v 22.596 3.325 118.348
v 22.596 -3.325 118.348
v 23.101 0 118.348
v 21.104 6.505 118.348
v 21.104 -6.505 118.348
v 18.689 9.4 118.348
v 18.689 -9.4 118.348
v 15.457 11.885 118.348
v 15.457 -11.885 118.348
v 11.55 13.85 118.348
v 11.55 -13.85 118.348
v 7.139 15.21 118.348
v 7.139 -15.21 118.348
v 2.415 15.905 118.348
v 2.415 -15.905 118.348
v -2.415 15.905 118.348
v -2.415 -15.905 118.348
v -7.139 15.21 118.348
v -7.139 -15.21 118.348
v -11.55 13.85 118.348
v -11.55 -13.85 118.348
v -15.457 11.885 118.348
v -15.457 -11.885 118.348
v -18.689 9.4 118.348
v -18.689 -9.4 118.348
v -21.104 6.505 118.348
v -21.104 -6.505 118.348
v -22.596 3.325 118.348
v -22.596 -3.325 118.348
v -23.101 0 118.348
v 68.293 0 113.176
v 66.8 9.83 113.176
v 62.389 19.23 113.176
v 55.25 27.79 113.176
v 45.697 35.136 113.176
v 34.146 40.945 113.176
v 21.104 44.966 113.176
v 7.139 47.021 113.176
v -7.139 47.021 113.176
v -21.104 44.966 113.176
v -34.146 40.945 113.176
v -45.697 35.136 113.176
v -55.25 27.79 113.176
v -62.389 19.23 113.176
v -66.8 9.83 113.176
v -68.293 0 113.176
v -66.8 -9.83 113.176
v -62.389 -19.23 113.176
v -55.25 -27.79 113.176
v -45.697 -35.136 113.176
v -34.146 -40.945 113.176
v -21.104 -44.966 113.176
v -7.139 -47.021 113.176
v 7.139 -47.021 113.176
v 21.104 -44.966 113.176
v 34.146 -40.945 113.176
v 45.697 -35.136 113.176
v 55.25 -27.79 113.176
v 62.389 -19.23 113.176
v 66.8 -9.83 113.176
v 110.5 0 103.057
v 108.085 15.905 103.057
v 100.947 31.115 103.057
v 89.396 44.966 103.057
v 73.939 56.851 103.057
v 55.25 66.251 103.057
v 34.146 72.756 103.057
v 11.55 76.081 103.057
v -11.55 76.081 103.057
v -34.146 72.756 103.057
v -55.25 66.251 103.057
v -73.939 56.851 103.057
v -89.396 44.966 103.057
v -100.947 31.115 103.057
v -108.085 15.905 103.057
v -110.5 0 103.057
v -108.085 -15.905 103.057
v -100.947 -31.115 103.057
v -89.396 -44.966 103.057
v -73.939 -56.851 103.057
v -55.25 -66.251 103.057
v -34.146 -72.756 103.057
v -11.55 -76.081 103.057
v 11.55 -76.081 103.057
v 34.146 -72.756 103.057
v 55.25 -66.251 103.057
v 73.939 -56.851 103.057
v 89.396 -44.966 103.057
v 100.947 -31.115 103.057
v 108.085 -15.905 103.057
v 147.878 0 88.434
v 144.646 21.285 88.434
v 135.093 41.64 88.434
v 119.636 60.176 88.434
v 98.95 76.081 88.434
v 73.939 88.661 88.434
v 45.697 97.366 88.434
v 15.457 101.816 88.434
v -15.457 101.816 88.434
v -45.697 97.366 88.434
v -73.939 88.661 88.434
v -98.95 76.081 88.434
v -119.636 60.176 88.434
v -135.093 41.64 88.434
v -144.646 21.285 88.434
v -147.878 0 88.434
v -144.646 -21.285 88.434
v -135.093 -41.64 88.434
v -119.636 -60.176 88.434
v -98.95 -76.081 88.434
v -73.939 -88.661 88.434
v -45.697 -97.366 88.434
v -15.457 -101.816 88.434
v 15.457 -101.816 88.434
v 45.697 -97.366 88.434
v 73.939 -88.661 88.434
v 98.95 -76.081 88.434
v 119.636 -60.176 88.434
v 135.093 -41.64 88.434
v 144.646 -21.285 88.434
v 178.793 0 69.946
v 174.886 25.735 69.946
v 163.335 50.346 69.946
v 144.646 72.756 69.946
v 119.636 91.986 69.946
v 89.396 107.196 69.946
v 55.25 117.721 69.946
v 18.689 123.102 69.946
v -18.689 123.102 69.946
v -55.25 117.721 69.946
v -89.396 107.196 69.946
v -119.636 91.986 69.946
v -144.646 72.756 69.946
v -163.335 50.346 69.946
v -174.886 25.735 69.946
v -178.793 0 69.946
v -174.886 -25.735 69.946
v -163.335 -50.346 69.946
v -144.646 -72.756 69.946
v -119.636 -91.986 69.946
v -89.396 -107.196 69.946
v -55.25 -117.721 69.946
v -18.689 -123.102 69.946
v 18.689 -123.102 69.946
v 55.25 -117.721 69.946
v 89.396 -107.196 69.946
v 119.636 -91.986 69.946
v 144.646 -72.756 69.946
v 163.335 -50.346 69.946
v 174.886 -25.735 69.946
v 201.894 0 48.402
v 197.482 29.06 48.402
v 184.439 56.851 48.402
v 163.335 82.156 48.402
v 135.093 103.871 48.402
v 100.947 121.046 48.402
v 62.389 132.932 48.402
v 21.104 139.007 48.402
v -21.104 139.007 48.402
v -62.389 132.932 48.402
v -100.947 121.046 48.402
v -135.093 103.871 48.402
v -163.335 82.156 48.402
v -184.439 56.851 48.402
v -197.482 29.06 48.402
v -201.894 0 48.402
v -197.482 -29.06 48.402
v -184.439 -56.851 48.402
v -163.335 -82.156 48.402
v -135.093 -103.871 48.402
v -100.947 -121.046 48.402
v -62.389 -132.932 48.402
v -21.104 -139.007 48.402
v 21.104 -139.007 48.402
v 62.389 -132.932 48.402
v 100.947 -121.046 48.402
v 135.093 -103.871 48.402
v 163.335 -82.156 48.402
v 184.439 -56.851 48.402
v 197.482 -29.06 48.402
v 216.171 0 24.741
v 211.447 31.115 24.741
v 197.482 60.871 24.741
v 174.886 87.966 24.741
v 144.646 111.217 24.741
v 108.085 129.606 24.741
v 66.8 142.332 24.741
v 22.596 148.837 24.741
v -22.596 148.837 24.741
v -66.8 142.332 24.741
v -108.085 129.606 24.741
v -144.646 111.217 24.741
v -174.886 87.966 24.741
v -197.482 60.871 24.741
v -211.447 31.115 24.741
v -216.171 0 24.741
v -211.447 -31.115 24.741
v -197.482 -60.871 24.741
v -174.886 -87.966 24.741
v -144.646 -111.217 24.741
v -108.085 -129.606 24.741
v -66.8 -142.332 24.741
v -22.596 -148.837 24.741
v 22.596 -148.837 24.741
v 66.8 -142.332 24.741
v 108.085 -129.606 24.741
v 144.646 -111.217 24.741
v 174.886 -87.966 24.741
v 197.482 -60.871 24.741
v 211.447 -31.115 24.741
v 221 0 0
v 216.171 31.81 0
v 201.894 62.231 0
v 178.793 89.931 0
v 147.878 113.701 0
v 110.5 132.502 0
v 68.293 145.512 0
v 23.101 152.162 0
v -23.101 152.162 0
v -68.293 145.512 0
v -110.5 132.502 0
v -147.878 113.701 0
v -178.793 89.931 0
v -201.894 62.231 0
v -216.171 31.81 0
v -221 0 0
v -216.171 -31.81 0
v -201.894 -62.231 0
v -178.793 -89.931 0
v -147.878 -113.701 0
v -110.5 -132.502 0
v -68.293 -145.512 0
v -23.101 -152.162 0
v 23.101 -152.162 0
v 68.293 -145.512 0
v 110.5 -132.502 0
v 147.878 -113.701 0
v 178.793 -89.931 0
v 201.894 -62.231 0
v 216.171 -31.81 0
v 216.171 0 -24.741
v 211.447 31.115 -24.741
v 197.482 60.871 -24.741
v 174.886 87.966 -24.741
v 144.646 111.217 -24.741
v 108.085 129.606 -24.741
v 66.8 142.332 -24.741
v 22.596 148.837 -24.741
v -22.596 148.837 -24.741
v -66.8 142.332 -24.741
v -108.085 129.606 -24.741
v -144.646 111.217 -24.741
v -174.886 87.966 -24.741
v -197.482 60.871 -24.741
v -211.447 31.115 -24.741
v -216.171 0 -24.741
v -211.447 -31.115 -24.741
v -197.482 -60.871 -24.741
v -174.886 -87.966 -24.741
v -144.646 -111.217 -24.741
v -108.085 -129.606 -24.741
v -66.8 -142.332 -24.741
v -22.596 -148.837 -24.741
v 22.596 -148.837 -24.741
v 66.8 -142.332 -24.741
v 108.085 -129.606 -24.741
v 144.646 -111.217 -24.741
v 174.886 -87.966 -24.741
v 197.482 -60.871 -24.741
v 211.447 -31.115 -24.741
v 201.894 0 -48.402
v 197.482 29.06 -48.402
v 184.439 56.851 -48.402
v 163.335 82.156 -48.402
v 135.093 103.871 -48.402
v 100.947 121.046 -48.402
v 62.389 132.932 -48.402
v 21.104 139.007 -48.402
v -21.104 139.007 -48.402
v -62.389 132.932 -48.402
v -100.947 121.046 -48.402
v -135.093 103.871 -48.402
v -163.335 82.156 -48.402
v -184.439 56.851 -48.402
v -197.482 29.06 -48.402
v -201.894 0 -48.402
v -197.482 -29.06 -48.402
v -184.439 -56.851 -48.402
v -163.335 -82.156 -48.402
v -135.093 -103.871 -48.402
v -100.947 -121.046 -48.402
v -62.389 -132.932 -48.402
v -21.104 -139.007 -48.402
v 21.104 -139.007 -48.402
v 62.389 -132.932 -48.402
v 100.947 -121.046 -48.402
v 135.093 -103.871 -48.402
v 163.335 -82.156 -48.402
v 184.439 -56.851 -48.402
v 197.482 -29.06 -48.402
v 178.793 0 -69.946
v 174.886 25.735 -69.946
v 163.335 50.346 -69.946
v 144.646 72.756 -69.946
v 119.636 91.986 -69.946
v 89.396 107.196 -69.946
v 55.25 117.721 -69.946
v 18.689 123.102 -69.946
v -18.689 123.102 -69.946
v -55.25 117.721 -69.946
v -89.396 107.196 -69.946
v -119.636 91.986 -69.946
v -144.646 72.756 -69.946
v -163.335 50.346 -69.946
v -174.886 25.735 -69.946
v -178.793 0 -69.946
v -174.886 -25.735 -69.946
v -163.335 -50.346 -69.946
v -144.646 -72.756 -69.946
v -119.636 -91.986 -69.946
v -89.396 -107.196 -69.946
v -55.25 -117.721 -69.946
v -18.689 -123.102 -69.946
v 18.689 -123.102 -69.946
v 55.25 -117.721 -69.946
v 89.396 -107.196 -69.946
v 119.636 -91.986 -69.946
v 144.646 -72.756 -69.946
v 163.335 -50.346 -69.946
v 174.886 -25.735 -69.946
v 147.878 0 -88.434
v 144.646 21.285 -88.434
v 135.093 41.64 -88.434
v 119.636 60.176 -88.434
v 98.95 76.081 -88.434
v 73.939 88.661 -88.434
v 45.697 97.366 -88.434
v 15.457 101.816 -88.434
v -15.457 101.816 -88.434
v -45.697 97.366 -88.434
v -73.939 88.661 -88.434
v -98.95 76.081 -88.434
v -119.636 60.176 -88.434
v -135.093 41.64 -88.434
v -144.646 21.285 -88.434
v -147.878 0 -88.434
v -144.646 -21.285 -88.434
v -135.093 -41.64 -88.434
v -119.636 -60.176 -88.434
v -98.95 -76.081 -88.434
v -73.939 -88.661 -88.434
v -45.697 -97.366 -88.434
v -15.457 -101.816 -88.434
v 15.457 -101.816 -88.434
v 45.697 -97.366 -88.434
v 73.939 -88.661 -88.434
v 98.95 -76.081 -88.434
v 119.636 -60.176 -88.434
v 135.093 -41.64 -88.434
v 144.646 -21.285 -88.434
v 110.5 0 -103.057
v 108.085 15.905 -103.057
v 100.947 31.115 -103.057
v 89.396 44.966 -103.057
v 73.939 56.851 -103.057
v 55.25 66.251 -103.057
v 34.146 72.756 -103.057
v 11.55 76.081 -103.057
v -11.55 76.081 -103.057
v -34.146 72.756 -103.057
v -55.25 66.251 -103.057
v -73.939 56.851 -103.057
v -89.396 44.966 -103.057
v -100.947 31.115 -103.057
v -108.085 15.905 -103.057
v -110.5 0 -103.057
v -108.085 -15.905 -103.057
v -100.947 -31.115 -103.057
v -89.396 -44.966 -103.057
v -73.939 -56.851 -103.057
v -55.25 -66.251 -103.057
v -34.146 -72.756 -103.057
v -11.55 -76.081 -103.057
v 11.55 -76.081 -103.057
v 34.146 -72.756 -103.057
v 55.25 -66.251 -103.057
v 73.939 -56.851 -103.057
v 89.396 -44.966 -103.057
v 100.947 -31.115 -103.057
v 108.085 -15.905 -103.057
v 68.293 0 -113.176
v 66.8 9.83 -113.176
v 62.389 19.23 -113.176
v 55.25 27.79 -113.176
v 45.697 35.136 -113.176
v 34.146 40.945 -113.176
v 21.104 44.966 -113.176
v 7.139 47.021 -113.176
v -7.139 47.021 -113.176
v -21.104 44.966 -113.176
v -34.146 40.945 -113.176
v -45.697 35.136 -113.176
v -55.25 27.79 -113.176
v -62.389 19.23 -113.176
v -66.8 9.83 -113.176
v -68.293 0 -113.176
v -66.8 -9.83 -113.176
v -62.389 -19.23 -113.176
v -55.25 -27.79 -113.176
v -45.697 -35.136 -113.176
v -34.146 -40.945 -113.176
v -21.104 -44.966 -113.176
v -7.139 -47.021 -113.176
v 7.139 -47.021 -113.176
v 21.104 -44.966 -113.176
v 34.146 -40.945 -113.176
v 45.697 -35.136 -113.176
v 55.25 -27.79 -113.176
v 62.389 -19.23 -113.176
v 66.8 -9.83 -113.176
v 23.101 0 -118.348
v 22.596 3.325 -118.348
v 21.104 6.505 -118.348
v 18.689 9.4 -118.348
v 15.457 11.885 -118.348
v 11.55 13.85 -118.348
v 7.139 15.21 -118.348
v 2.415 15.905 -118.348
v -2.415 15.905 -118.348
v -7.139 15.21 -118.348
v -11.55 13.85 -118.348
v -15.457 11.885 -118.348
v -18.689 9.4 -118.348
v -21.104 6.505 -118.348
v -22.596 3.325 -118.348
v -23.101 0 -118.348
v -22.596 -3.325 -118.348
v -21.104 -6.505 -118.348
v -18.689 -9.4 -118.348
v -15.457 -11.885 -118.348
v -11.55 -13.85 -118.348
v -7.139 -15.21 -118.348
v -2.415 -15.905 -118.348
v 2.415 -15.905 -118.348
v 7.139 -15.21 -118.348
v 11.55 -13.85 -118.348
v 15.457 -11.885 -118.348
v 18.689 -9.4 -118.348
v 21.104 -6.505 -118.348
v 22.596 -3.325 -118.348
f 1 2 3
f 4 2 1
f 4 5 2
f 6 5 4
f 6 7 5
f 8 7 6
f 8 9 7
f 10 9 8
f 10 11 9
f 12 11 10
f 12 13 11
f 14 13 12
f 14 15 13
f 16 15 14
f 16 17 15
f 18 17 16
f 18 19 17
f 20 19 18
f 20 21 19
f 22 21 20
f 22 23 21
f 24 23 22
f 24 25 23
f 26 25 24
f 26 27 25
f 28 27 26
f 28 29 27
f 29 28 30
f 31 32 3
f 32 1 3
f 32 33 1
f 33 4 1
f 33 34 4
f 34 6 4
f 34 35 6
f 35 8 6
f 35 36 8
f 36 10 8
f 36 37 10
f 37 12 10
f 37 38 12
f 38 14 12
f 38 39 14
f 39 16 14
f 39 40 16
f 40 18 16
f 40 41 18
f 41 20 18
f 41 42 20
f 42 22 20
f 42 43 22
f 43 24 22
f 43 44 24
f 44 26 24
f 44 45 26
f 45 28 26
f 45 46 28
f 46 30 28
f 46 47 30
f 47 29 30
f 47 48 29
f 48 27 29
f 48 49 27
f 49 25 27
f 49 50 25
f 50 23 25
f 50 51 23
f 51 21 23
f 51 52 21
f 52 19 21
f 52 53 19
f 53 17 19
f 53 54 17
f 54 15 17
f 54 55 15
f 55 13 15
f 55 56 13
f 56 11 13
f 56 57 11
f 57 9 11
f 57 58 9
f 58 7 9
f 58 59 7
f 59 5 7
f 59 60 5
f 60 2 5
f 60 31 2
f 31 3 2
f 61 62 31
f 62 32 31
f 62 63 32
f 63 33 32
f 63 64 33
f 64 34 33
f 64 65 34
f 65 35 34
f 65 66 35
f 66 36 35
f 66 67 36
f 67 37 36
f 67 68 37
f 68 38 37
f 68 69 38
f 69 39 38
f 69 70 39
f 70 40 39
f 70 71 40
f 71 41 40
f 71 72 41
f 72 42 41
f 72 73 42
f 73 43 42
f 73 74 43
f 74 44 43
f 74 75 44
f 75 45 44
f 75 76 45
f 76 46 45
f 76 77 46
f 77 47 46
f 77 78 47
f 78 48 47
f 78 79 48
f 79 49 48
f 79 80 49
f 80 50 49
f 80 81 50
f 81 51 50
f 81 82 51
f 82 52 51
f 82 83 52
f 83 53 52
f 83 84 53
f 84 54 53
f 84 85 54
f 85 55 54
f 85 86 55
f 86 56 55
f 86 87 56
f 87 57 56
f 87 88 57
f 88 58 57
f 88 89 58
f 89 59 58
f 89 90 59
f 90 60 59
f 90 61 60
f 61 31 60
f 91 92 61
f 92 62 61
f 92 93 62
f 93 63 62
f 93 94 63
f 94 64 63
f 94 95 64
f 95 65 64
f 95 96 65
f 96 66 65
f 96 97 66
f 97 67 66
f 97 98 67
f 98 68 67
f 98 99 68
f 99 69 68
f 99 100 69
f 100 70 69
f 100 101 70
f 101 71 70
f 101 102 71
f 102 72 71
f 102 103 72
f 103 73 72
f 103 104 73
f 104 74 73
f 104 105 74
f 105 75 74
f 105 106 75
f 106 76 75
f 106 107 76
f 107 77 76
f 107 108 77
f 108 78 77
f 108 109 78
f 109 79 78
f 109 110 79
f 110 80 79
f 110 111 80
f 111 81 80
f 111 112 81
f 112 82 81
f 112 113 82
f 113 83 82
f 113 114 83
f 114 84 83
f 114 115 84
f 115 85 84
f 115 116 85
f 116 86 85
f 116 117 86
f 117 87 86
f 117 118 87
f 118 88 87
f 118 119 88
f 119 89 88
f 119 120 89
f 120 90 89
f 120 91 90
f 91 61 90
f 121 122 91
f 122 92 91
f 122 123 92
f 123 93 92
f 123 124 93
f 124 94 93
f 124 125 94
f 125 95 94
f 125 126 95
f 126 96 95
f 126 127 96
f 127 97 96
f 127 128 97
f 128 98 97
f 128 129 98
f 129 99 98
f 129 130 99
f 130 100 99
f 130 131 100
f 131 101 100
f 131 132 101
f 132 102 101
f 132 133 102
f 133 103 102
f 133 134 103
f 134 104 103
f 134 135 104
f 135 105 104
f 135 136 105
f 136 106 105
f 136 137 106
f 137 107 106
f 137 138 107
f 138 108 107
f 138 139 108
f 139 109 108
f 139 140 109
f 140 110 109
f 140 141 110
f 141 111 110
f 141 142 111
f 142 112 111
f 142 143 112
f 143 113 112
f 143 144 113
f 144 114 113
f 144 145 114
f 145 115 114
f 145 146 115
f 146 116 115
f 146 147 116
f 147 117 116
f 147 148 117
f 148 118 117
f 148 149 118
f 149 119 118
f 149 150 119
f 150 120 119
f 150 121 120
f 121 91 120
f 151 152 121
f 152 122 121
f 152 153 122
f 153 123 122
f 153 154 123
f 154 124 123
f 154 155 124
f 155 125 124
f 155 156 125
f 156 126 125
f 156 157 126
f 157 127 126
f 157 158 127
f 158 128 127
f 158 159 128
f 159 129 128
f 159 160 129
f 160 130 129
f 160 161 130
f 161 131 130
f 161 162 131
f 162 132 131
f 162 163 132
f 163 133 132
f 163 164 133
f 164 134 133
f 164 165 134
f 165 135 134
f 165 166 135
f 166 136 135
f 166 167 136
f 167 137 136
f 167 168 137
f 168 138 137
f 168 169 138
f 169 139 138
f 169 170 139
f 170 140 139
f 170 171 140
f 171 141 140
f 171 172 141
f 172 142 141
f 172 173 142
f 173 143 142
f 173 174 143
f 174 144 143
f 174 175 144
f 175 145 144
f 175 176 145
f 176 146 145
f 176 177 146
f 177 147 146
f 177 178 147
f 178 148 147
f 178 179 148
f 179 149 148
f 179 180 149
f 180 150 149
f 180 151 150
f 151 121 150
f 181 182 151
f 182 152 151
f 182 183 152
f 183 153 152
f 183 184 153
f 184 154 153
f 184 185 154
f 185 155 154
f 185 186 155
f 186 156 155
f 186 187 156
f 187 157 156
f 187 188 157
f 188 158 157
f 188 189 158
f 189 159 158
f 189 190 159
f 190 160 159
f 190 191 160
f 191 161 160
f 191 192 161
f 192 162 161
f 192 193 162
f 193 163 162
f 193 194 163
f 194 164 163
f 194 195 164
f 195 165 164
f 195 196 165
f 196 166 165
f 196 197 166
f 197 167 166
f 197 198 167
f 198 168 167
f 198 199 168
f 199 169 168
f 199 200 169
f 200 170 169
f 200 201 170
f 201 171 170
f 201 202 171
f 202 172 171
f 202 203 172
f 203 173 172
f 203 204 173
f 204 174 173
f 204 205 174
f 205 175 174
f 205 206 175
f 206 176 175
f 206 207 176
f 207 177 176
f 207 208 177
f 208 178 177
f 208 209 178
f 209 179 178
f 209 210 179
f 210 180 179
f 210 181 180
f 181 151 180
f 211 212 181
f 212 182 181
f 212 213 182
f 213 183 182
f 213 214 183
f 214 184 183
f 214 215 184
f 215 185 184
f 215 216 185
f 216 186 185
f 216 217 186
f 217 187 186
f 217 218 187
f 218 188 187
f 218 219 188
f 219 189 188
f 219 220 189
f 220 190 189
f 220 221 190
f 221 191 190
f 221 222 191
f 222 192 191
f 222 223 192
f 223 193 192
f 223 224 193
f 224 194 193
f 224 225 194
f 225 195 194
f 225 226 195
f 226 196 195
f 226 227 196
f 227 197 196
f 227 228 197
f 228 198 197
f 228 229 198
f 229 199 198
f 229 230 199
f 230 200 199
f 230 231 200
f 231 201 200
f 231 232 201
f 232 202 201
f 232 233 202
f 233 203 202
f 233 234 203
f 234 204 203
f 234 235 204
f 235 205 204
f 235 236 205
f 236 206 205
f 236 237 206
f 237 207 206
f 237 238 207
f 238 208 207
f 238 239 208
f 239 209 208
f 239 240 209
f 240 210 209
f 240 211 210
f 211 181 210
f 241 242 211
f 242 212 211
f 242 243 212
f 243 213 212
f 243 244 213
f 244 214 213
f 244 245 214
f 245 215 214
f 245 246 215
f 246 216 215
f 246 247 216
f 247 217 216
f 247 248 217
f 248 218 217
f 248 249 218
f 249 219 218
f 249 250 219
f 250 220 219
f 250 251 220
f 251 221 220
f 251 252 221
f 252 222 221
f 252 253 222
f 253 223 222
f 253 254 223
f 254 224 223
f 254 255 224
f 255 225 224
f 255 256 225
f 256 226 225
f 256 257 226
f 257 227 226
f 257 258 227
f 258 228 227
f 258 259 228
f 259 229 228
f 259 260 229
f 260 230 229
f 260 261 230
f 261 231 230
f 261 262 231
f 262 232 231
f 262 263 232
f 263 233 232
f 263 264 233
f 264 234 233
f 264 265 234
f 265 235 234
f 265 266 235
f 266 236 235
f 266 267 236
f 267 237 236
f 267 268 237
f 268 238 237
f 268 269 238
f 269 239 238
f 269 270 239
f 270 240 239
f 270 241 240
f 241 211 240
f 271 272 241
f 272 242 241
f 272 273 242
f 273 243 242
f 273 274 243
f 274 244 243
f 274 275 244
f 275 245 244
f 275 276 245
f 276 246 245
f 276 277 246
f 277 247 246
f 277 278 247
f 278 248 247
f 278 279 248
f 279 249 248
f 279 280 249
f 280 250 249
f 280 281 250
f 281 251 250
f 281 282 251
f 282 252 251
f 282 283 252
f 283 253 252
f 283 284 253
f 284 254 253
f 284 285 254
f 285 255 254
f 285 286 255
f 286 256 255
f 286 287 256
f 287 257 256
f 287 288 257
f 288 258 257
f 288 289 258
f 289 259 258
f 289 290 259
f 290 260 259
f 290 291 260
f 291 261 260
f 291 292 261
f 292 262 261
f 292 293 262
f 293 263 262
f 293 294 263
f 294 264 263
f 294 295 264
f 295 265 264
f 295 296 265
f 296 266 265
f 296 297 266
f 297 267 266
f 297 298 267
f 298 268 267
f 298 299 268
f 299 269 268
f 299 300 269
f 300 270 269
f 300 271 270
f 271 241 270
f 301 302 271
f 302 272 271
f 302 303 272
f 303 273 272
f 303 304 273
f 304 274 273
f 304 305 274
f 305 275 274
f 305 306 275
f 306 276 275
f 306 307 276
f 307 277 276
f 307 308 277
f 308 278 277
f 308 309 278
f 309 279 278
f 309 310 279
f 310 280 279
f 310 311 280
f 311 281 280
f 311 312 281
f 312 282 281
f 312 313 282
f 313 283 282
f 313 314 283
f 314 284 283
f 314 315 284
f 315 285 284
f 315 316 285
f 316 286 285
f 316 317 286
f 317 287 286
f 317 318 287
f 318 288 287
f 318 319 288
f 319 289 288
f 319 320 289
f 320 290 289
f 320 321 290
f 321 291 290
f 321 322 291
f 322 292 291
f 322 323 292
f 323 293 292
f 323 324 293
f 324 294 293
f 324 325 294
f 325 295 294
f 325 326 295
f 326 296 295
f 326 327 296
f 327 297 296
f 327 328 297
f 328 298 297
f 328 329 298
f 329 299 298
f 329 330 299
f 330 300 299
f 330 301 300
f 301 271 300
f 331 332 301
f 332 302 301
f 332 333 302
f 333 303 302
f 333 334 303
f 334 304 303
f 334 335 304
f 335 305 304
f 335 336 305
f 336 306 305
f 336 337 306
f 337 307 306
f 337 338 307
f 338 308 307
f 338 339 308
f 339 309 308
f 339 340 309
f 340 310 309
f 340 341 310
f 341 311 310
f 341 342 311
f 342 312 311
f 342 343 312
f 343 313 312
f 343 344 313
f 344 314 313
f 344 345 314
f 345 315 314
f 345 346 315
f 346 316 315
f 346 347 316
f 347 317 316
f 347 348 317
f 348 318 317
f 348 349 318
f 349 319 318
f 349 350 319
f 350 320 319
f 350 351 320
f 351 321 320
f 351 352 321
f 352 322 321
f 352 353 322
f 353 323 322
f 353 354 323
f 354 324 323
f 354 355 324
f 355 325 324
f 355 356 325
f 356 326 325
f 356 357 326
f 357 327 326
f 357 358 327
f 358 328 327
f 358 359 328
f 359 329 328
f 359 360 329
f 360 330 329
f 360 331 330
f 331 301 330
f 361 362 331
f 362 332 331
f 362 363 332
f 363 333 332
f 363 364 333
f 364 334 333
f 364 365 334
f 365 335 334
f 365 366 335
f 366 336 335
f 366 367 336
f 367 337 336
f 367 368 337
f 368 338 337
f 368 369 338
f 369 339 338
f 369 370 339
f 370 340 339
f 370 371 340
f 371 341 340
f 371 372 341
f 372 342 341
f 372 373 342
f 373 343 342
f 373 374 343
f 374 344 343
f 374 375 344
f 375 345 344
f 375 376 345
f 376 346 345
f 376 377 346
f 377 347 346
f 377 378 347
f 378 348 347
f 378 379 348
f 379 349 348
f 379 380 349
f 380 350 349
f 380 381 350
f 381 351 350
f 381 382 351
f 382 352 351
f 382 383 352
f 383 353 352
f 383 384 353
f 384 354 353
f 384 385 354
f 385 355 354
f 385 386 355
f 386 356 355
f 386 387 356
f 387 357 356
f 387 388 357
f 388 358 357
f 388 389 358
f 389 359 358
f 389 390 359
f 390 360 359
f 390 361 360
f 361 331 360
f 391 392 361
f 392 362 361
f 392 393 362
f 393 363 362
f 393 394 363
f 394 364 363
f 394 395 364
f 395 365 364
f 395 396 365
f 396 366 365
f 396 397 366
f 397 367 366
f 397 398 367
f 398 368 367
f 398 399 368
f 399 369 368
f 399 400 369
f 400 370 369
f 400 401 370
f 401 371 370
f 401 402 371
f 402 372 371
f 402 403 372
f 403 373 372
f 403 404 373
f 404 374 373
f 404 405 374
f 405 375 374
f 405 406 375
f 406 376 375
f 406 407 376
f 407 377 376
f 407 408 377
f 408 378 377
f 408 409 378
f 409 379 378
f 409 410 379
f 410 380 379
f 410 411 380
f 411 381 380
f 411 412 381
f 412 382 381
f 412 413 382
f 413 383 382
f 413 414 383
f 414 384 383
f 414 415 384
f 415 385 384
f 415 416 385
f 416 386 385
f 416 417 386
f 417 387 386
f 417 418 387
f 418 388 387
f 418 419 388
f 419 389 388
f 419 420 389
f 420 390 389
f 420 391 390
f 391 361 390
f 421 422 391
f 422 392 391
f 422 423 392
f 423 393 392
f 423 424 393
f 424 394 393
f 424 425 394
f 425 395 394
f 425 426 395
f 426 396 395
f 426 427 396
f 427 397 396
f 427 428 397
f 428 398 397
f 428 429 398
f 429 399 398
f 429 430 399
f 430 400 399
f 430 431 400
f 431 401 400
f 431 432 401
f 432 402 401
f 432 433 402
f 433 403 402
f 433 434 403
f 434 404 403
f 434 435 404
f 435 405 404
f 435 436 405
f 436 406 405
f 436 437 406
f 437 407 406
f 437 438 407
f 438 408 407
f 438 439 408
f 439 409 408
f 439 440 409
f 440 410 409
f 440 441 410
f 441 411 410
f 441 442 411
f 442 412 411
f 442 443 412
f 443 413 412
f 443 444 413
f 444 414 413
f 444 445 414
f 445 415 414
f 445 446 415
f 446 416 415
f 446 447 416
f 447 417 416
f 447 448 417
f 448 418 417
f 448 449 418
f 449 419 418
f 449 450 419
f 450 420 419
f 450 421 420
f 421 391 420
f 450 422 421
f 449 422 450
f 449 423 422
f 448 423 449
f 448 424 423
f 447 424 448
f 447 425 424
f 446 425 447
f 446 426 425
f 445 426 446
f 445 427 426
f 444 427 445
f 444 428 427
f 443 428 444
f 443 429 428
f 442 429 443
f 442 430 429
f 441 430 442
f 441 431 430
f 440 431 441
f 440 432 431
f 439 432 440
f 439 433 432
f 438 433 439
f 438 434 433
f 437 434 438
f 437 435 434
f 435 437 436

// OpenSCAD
// Generated by SolidPython 1.0.1 on 2020-07-29 00:46:50


scale(v = [13, 9, 7]) {
	sphere(r = 17);
}
/***********************************************
*********      SolidPython code:      **********
************************************************
 
# import packages: SolidPython
from solid import *
from solid.utils import *
from itertools import chain, combinations, permutations


class Resize:

    def __init__(self, scad_file):
        self.scad_file = scad_file
        #self.scad_file = import_scad(scad_file)
        # cone/cylinder param:
        self.r1 = 0
        self.r2 = 0
        self.h = 0
        # rectangular prism param:
        self.w = 0
        self.l = 0
        # ellipse param:
        self.r = 0

    # import OpenScad code (file name corresponds to shape)


    # classify shape + parameters
    def assign(self, param1, param2, param3):
        if self.scad_file == 'cone.scad':
            self.r1 = param1
            self.r2 = param2
            self.h = param3
        elif self.scad_file == 'cylinder.scad':
            self.r1 = param1
            self.r2 = param2
            self.h = param3
        elif self.scad_file == 'rectangularPrism.scad':
            self.h = param1
            self.l = param2
            self.w = param3
        else:
            self.r = param1
            self.h = param2

    # resize parameters
    def iterate(self):
        x = range(3, 20, 2)
        i = 1
        if self.scad_file == 'cone.scad':
            tempList = list(permutations(x, 2))
            for temp in tempList:
                param1 = temp[0]
                param2 = temp[1]
                filepath = 'produced_scad_files/' + 'cone' + str(param1) + '_' + str(param2) + '_' + '.scad'
                scad_render_to_file(cylinder(h=param1, r1=param2, r2=0), filepath)

        elif self.scad_file == 'cylinder.scad':
            tempList = list(permutations(x, 3))
            for temp in tempList:
                param1 = temp[0]
                param2 = temp[1]
                filepath = 'produced_scad_files/' + 'cylinder' + str(param1) + '_' + str(param2) + '_' + '.scad'
                scad_render_to_file(cylinder(h=param1, r1=param2, r2=param2), filepath)

        elif self.scad_file == 'rectangularPrism.scad':
            tempList = list(permutations(x, 3))
            for temp in tempList:
                param1 = temp[0]
                param2 = temp[1]
                param3 = temp[2]
                filepath = 'produced_scad_files/' + 'rectangularPrism' + str(param1) + '_' + str(param2) + '_' + str(
                    param3) + '.scad'
                scad_render_to_file(cube(size=(param1, param2, param3)), filepath)

        elif self.scad_file == 'ellipse.scad':
            tempList = list(permutations(x, 4))
            for temp in tempList:
                param1 = temp[0]
                param2 = temp[1]
                param3 = temp[2]
                param4 = temp[3]
                filepath = 'produced_scad_files/' + 'ellipse' + str(param1) + '_' + str(param2) + '_' + str(param3) + '_' + str(param4) + '.scad'
                scad_render_to_file(scale([param1, param2, param3])(sphere(r=param4)), filepath)

    def render_to_scadfile(self):
        scad_render_to_file(scad, 'example.scad') 
 
************************************************/
